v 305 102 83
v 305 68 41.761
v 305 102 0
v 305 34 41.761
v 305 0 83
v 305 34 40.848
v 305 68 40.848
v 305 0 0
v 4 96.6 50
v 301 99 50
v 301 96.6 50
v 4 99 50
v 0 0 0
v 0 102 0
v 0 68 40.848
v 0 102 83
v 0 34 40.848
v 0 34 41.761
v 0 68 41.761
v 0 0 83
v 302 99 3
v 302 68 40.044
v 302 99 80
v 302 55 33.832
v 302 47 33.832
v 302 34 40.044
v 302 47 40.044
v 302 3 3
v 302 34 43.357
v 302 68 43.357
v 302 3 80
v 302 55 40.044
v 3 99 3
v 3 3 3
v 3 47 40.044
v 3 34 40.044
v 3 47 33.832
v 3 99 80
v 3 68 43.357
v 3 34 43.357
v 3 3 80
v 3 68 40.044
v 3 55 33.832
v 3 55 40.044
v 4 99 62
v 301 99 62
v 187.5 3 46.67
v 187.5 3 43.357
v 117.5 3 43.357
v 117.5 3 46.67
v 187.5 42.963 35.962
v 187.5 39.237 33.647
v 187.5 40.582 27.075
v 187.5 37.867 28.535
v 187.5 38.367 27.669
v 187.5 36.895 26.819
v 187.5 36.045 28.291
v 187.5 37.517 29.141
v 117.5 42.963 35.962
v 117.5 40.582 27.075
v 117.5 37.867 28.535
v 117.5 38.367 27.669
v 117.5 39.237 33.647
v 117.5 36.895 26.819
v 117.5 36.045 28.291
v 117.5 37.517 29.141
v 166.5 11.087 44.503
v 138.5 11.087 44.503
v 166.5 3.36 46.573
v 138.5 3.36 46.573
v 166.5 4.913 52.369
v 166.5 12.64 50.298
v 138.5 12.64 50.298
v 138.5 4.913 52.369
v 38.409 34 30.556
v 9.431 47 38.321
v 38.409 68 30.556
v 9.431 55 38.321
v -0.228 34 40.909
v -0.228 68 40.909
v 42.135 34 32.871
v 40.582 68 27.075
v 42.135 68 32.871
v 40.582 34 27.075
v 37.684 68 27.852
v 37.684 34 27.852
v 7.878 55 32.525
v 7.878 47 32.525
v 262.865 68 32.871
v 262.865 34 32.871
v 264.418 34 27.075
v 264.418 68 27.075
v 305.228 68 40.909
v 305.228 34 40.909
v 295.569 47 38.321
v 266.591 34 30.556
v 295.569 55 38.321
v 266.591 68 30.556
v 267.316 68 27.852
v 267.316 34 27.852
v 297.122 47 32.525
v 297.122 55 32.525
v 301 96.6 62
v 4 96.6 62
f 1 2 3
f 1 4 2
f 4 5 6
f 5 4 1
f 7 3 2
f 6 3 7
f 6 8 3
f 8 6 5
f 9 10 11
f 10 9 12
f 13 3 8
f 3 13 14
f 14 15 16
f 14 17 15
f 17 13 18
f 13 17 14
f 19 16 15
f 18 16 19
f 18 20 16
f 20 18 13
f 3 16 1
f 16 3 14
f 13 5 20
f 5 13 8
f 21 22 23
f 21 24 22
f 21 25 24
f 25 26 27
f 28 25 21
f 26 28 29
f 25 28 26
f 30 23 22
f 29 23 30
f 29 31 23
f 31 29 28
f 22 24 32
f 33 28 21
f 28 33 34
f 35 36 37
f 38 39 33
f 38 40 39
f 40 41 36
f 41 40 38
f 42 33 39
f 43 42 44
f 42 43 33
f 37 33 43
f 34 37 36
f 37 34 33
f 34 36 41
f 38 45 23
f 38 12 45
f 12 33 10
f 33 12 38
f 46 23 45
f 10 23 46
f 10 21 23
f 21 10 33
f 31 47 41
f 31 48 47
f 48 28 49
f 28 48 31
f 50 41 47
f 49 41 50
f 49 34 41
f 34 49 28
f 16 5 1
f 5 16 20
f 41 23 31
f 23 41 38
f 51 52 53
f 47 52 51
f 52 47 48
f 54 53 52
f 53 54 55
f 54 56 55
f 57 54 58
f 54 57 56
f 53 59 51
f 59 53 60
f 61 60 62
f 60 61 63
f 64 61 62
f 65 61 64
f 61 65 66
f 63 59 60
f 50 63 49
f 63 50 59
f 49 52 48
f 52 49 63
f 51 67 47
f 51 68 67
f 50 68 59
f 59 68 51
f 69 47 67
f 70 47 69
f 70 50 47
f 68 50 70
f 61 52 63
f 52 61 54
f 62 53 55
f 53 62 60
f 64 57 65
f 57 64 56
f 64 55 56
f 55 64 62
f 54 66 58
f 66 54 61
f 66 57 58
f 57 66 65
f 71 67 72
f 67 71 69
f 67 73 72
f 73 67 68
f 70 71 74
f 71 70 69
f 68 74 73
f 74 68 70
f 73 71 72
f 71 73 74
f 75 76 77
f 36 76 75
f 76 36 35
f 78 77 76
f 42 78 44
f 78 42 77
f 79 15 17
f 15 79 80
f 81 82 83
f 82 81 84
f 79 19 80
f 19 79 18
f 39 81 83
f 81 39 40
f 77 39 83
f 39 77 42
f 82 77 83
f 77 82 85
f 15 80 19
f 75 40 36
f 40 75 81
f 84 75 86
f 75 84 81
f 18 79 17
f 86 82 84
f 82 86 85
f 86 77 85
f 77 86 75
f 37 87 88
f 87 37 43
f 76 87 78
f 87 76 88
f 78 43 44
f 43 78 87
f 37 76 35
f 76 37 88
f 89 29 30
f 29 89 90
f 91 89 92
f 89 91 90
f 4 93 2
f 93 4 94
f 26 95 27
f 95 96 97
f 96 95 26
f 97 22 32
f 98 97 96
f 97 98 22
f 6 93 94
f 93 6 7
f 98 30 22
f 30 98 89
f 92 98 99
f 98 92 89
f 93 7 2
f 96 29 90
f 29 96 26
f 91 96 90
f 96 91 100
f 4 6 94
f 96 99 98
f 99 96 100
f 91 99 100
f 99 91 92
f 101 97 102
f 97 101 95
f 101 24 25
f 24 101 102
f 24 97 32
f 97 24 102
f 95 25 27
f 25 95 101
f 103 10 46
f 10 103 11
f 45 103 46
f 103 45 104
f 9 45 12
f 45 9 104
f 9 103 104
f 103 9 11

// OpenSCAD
// file: common.scad
// common.scad — shared geometry for FLIP-LEVER / CAM-LATCH RIM CLAMP family
// Coordinate frame:
//   X: 0..305 (long axis)   Y: 0..102 (Y=0 FRONT/open, Y=102 BACK/door=FLUSH)
//   Z: up.  New tray base z=0, top face z=50.  Top tray base z=50, rim top z=83.
// ALL levers/hinges live on FRONT wall (y=0) and SHORT ENDS (x=0, x=305).
// NOTHING crosses y=102 (door face). Top tray gets ZERO added geometry.

// ── master dims ────────────────────────────────────────────────
NW = 305;  ND = 102;  NH = 50;   // new tray
TW = 305;  TD = 102;  TH = 33;   // top tray (FIXED reference)
wall = 3;
rim_top_z = NH + TH;             // = 83

// ── colours ────────────────────────────────────────────────────
C_new   = "#1565C0";
C_top   = "#90A4AE";
C_lever = "#EF6C00";   // override per file if desired

// ── core tray bodies ───────────────────────────────────────────
module new_tray() {
    color(C_new)
    difference() {
        cube([NW, ND, NH]);
        translate([wall, wall, wall])
            cube([NW-2*wall, ND-2*wall, NH]);
        // side windows (long walls): 45(X)x16(Z), center z=64 -> 56..72
        for (cx = [76.25, 152.5, 228.75]) {
            // FRONT wall y=0..3
            translate([cx-22.5, -0.1, 56]) cube([45, wall+0.2, 16]);
            // BACK wall y=99..102
            translate([cx-22.5, ND-wall-0.1, 56]) cube([45, wall+0.2, 16]);
        }
    }
}

// FLUSH back guide wall: a low rib on the new tray top face along the BACK
// edge that pockets the top tray's outer wall from the INSIDE only.
// It rises to z below the rim and DOES NOT overhang the drop path and
// NEVER crosses y=102 (it sits inboard of the door face).
module back_guide() {
    gw = 2.4;          // guide rib thickness
    gh = 12;           // rib height above new tray top (z=50..62)
    inset = wall;      // inner face aligns to tray inner wall (y=99 plane outer)
    color(C_new)
    translate([wall+1, ND - wall - gw, NH])
        cube([NW - 2*(wall+1), gw, gh]);
}

module top_tray() {
    color(C_top)
    translate([0, 0, NH])
    difference() {
        cube([TW, TD, TH]);
        translate([wall, wall, 0])
            cube([TW-2*wall, TD-2*wall, TH-wall]);
    }
}
// main file
// 05_ends_plus_center.scad
// FLIP-LEVER RIM CLAMP — Minimalist 3-latch: ONE central FRONT cam lever +
// one END clamp at each SHORT END. Three clamp points form a stable tripod
// (front-center + two ends) that pins the rigid top tray down; the BACK/door
// edge is held by the flush back guide wall + the tray's own corners.
// NONE on back/door.
//
// Living-hinge web on FRONT outer wall; end clamps on the END walls.
include <common.scad>
C_lever = "#2E7D32";
lock = 0;
$fn = 48;

hinge_z   = NH - 6;
arm_len   = rim_top_z - hinge_z + 4;
bar_t     = 3.2;
lhinge_t  = 0.6;
lip_ext   = 6;
lip_t     = 3.0;
cam_w     = 70;            // wide central lever

ang_open   = -105;
ang_locked = 6;
cam_ang = lock ? ang_locked : ang_open;

module front_cam(cx) {
    color(C_lever)
    translate([cx-cam_w/2, lhinge_t, hinge_z])
    rotate([cam_ang, 0, 0])
    union() {
        translate([0, -bar_t, 0]) cube([cam_w, bar_t, arm_len]);
        translate([0, 0, arm_len-lip_t]) cube([cam_w, lip_ext, lip_t]);
        translate([0, lip_ext, arm_len-lip_t])
            rotate([45,0,0]) translate([0,-1.2,-1.2]) cube([cam_w,1.7,1.7]);
        translate([cam_w/2-14, -bar_t-6, 2]) cube([28,6,8]);
    }
    color(C_lever)
    translate([cx-cam_w/2, 0, hinge_z-3]) cube([cam_w, lhinge_t, 3]);
}

end_w = 34;
module end_clamp(side) {
    xbase = side<0 ? lhinge_t : NW - lhinge_t;
    eang = lock ? 6 : -105;
    yoff = (ND-end_w)/2;
    sx = side<0 ? 1 : -1;
    color(C_lever)
    translate([xbase, yoff, hinge_z])
    rotate([0, side<0 ? -eang : eang, 0])
    union() {
        translate([sx<0 ? -bar_t:0, 0, 0]) cube([bar_t, end_w, arm_len]);
        translate([sx<0 ? -lip_ext:0, 0, arm_len-lip_t]) cube([lip_ext, end_w, lip_t]);
        translate([sx<0 ? -bar_t-6:bar_t, end_w/2-4, 2]) cube([6,8,8]);
    }
}

new_tray();
back_guide();
top_tray();
front_cam(NW/2);
end_clamp(-1);
end_clamp(1);
